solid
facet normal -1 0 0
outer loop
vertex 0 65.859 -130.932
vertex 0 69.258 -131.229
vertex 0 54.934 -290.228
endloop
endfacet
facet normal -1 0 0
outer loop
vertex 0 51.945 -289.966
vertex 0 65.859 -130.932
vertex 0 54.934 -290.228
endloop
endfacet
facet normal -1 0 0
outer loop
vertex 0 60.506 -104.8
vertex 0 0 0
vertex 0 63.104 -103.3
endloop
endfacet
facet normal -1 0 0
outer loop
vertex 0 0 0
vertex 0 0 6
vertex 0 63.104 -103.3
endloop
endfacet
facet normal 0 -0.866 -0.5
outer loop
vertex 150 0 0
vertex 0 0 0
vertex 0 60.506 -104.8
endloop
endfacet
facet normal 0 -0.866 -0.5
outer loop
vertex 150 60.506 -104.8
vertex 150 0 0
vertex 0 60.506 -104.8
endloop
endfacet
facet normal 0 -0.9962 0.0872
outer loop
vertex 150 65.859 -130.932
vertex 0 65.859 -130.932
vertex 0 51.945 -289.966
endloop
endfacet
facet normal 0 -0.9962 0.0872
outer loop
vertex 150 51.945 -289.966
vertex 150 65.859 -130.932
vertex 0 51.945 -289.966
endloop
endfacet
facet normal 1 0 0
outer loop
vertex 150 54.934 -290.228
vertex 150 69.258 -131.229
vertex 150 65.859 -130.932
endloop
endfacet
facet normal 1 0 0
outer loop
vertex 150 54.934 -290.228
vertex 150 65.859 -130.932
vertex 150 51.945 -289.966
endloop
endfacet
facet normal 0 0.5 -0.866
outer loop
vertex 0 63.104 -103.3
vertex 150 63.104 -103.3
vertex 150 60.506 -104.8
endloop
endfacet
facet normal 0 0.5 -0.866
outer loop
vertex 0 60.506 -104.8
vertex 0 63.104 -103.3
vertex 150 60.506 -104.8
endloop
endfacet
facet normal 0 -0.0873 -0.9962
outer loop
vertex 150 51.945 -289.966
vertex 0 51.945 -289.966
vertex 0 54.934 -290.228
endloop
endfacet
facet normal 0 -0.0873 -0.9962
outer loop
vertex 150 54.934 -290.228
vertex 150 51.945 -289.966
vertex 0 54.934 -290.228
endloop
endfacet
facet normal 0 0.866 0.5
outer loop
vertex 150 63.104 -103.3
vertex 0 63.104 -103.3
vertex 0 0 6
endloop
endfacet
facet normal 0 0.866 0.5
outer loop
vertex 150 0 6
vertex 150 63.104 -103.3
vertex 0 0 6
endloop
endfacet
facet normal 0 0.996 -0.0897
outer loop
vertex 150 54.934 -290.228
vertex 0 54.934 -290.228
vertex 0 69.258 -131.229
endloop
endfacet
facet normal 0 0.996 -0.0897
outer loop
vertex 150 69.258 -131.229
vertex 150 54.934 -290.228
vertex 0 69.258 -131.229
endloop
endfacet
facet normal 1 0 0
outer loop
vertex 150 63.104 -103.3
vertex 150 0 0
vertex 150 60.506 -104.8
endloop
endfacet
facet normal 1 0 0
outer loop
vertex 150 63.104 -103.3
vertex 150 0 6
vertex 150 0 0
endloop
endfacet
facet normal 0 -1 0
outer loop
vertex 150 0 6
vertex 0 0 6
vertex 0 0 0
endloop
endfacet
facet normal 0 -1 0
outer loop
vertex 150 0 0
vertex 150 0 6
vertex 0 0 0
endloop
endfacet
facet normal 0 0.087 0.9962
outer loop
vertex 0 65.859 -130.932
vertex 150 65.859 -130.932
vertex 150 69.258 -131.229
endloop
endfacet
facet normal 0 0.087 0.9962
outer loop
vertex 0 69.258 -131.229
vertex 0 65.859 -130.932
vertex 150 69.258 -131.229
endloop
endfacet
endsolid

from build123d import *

# Parameters (mm, degrees)
BOSS_EXTRUDE1_DEPTH = 150
CUT_EXTRUDE1_DEPTH  = 335.241226584


with BuildPart() as part:
    # Sketch1 → Boss-Extrude1 (new body)
    with BuildSketch(Plane(origin=(0, 0, 0), x_dir=(0, 0, -1), z_dir=(1, 0, 0))):
        Polygon((0, 0), (116.28989122, 67.14), (289.966474885, 51.945267809), (290.227942114, 54.933851904), (116.28989122, 70.604101615), (-6, 0), align=None)
    extrude(amount=BOSS_EXTRUDE1_DEPTH)

    # Sketch4 → Cut-Extrude1 (cut, through all)
    with BuildSketch(Plane(origin=(150, 0, 0), x_dir=(0, 0, -1), z_dir=(1, 0, 0))):
        Polygon((103.299510163, 63.104101615), (104.799510163, 60.506025404), (116.28989122, 67.14), (130.931994417, 65.85898196), (131.229386395, 69.258187833), (116.28989122, 70.604101615), align=None)
    extrude(amount=-CUT_EXTRUDE1_DEPTH, mode=Mode.SUBTRACT)


with BuildPart() as cut_extrude1_piece_1:
    # of the separate pieces the step leaves, piece 1, a body of its own (cut_extrude1_pieces)
    add(part.part.solids().sort_by_distance((0, 65.85898196, -130.931994417))[0])


with BuildPart() as cut_extrude1_piece_2:
    # of the separate pieces the step leaves, piece 2, a body of its own (cut_extrude1_pieces)
    add(part.part.solids().sort_by_distance((0, 0, 0))[0])


solid = Compound([cut_extrude1_piece_1.part, cut_extrude1_piece_2.part])
